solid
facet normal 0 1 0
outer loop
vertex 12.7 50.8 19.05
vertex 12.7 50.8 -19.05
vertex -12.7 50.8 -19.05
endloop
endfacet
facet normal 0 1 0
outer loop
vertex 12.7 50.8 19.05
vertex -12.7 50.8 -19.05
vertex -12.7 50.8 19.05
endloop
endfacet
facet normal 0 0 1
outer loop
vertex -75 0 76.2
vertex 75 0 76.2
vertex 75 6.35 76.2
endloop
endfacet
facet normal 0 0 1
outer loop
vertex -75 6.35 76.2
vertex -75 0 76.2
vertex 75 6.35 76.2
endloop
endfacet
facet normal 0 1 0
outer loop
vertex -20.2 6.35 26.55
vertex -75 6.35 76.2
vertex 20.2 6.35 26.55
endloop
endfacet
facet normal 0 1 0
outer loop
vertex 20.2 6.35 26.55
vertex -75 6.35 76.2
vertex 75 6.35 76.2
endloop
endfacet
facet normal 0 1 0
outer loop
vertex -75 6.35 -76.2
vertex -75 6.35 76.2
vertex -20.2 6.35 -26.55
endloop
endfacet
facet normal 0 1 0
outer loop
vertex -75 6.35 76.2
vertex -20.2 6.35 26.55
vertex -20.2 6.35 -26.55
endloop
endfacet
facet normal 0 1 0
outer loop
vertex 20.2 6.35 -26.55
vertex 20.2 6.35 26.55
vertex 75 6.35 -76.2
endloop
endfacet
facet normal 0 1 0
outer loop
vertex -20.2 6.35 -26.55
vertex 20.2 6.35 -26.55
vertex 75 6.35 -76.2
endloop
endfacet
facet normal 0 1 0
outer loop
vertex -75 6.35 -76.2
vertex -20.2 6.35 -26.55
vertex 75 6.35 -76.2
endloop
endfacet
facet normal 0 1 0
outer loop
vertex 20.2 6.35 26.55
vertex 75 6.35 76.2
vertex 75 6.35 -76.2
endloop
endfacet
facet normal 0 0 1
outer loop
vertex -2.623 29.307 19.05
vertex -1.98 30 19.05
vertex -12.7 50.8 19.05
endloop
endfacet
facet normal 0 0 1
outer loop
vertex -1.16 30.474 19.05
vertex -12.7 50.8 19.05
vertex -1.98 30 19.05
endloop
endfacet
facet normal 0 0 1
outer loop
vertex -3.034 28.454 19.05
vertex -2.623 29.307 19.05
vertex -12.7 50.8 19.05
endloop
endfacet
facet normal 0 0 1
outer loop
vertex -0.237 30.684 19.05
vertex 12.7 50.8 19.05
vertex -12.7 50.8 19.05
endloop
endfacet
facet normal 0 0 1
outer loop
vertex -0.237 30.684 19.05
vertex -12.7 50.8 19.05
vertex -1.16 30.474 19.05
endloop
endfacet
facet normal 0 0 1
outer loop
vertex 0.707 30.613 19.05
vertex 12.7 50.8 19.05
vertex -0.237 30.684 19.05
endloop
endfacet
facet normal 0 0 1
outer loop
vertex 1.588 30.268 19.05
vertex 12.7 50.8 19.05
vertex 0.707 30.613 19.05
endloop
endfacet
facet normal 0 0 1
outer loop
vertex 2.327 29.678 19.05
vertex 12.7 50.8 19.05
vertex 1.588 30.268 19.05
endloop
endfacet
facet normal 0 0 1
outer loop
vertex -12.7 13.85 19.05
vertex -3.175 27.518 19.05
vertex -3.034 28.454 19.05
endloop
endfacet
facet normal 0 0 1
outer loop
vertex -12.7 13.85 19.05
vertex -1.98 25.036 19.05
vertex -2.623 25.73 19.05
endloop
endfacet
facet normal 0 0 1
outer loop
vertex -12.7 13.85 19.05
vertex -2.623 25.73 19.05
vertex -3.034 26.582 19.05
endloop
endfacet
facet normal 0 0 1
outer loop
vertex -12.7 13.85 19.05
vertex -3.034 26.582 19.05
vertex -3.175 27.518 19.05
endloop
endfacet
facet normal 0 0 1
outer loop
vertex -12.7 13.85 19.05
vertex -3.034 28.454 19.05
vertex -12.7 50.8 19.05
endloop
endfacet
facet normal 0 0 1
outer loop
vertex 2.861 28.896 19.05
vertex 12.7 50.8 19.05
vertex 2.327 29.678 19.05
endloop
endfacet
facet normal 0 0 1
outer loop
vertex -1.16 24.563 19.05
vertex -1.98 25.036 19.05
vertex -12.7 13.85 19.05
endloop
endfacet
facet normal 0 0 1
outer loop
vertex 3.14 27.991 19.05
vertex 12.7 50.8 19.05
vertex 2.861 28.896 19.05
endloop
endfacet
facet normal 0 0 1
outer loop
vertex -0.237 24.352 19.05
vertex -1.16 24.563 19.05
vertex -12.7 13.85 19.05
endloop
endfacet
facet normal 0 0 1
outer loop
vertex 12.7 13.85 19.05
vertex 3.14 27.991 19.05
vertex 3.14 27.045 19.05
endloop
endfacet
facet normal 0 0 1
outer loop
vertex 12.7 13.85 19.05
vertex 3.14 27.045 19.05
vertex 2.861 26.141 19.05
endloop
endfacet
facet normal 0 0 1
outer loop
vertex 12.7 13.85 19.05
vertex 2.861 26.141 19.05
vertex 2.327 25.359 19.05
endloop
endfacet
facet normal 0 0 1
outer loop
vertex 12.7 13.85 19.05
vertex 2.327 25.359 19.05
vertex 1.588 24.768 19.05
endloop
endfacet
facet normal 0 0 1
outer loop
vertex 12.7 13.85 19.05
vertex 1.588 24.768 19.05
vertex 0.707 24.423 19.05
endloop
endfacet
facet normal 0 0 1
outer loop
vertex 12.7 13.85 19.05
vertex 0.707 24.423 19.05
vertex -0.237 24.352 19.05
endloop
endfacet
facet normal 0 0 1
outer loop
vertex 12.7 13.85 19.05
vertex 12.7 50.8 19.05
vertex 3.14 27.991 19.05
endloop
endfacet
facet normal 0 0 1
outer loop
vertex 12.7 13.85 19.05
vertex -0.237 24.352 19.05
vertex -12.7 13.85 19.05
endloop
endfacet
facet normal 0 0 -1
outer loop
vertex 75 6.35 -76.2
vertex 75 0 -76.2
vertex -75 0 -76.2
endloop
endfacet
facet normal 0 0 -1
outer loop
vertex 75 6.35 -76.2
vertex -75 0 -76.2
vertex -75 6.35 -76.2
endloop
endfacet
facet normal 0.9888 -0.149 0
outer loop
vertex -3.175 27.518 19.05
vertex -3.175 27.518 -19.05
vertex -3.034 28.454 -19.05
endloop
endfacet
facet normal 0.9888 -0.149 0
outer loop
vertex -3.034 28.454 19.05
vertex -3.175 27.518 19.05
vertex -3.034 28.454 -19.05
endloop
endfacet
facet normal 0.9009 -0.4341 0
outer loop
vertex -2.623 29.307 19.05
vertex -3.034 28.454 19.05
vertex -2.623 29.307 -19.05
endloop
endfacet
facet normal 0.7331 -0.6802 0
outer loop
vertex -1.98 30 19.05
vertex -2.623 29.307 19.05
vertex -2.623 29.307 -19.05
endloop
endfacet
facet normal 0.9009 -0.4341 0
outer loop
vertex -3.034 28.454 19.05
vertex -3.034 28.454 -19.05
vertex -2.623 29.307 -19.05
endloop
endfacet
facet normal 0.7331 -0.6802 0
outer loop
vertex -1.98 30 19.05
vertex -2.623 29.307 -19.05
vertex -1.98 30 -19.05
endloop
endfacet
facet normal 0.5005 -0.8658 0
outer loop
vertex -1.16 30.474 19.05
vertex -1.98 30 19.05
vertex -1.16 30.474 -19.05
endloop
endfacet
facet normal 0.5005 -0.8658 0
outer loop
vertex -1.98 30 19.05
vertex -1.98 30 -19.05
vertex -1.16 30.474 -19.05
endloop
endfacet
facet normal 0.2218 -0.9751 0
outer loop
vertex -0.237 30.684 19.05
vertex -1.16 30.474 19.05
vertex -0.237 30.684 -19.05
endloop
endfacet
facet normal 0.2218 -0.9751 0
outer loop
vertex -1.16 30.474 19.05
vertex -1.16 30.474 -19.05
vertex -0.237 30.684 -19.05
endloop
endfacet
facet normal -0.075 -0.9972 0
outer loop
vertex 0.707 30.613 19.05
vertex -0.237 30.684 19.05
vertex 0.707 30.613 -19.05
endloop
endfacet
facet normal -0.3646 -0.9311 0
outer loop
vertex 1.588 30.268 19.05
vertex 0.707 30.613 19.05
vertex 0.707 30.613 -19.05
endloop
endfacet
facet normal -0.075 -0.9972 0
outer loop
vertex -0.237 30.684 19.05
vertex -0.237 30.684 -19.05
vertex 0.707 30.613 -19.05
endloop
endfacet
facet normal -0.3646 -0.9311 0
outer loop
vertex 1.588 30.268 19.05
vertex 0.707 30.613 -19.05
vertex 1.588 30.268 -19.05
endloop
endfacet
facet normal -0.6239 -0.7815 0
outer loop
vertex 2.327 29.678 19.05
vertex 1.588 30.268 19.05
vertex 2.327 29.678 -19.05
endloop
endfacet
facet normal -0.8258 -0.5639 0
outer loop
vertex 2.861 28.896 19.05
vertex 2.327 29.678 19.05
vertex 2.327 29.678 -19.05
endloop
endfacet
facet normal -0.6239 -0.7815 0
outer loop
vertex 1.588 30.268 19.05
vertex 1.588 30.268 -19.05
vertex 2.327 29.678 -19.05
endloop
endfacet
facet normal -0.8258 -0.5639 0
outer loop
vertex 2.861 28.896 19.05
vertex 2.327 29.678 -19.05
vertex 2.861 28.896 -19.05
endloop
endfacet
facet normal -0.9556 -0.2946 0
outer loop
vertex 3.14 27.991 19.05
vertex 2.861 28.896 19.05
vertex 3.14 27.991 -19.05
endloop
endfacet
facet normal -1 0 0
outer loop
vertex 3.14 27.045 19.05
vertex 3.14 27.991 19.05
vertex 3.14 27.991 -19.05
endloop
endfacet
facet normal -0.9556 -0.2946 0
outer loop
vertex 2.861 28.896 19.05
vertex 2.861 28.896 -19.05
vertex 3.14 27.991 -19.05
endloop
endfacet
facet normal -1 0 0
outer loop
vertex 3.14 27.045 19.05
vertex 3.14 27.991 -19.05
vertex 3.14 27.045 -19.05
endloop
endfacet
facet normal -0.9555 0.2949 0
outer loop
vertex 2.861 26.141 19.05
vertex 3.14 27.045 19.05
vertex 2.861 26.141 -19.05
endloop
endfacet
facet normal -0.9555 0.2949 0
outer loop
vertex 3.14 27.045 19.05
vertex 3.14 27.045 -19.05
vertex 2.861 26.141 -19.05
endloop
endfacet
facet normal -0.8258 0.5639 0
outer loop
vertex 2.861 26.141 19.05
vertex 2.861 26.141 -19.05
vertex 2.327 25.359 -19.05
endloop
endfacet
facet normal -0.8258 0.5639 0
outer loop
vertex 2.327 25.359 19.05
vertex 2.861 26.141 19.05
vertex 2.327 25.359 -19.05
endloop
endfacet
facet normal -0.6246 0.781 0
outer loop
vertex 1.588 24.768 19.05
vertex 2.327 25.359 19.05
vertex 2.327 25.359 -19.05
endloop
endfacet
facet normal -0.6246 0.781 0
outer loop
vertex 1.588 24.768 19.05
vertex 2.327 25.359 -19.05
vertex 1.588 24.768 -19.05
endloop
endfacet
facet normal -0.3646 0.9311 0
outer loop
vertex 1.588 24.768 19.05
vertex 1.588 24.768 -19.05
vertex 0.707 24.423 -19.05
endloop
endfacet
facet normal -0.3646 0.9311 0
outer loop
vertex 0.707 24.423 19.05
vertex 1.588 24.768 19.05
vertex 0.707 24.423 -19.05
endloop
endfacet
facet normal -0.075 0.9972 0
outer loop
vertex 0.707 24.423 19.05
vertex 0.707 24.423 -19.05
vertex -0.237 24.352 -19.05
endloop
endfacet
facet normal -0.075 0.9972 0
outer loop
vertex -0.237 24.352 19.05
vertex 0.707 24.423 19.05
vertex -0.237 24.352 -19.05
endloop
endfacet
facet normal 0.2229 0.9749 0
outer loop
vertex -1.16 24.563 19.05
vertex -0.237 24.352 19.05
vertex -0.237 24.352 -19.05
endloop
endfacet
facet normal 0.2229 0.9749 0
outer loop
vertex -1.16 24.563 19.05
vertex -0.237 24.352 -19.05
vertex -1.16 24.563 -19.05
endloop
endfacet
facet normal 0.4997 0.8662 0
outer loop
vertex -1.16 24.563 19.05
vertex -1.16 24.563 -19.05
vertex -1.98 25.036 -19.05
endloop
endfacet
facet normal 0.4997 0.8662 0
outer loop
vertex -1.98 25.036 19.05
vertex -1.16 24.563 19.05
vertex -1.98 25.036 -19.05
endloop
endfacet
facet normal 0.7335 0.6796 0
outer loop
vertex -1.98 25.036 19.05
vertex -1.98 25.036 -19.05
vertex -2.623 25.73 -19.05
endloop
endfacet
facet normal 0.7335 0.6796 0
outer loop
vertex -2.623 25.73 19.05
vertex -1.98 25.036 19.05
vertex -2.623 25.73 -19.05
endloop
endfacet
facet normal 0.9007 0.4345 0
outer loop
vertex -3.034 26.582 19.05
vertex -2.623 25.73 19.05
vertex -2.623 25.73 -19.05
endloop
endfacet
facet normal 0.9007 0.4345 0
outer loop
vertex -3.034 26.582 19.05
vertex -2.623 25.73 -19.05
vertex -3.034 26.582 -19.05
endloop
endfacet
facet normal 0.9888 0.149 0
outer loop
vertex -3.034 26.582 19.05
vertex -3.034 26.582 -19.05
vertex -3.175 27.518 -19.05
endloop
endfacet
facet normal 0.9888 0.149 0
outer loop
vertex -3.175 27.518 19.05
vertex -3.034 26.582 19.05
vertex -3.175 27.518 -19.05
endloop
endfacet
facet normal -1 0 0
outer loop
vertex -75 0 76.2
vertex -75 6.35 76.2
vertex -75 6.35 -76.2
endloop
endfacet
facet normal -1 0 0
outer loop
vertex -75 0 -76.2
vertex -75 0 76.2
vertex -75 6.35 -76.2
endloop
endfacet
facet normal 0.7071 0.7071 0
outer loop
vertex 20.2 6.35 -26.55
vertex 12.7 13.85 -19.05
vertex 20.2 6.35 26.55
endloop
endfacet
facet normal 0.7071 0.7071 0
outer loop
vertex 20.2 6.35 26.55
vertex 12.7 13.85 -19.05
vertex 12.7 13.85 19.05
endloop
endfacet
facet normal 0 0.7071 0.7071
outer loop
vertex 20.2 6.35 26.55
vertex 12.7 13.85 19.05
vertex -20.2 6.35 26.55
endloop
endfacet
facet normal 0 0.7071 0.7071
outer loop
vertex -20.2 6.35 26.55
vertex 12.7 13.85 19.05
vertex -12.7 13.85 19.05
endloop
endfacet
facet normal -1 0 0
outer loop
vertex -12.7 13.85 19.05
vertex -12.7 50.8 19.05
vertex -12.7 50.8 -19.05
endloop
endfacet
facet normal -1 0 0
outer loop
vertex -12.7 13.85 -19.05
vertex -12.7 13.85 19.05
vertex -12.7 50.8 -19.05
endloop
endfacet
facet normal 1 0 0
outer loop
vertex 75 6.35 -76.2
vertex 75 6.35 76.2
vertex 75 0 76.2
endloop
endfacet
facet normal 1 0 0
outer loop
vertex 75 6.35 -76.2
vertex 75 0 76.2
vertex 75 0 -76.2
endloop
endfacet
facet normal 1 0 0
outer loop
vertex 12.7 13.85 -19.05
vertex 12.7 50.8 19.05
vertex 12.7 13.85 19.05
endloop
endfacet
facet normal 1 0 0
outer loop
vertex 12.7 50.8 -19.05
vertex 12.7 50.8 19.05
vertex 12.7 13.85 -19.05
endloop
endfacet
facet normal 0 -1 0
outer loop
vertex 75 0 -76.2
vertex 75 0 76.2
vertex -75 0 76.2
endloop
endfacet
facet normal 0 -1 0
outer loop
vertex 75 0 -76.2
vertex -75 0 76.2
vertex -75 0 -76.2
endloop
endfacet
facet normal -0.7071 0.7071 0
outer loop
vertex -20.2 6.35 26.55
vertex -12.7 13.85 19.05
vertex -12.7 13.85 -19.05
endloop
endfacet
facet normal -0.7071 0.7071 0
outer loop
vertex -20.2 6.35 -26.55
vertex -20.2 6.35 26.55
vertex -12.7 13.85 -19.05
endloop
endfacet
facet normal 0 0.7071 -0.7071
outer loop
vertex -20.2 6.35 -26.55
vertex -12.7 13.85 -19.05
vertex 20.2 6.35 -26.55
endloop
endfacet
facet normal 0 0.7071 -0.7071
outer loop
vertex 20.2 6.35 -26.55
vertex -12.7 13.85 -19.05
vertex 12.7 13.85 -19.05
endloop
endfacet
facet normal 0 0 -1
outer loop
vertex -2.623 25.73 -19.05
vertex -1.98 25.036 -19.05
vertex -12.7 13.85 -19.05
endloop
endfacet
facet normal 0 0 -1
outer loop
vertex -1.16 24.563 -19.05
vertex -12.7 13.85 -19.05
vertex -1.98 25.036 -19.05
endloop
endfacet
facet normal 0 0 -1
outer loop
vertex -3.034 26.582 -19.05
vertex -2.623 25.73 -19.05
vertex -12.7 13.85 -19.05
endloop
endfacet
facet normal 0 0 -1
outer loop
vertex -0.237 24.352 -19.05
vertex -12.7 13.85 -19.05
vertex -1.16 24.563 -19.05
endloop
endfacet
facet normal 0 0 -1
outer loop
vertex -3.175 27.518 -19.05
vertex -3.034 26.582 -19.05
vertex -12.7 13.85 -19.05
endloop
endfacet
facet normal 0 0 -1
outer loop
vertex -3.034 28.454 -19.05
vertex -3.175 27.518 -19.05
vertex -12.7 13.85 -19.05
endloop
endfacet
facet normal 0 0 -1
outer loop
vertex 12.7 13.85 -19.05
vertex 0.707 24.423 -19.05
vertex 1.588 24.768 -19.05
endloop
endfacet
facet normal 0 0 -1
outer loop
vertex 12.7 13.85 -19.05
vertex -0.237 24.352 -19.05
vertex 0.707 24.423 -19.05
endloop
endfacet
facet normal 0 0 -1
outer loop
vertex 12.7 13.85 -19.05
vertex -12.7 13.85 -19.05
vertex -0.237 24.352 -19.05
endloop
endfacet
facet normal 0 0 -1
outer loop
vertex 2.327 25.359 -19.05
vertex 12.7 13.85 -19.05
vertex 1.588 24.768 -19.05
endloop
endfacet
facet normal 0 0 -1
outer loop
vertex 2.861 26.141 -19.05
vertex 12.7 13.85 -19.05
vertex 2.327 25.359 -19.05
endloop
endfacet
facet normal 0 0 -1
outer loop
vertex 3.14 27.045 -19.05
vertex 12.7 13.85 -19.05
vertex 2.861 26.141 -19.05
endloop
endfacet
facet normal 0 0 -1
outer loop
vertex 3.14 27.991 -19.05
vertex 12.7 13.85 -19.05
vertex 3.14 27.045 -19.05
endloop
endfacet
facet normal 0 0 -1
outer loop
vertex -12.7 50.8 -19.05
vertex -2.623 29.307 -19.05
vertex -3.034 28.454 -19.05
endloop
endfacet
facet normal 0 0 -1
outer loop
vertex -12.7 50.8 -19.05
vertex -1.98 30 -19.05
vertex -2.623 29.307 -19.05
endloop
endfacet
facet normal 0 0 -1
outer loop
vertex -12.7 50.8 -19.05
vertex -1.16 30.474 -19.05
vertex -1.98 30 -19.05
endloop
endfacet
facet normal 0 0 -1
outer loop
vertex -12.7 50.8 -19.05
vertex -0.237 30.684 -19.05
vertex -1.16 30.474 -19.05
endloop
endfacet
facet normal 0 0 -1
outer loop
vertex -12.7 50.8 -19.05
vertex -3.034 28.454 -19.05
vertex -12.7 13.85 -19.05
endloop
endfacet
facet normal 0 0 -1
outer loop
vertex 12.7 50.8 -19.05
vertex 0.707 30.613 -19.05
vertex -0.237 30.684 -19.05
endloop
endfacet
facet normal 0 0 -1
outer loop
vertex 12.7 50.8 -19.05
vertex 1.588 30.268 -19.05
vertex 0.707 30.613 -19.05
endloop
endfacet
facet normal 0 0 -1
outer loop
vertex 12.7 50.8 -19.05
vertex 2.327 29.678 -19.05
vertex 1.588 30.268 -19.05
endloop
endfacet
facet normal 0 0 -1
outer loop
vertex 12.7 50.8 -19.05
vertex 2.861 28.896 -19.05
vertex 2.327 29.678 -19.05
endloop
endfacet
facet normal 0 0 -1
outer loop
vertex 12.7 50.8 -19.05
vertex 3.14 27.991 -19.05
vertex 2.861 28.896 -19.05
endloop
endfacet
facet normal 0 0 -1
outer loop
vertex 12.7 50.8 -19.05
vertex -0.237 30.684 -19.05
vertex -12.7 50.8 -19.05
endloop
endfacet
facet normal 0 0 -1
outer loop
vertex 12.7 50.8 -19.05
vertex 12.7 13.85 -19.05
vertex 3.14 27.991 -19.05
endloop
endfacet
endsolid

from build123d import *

# Parameters (mm, degrees)
BOSS_EXTRUDE1_DEPTH         = 12.7
BOSS_EXTRUDE1_DEPTH_BACK    = 12.7
F_1_4_0_25_DIAMETER_HOLE1_D = 6.35
BOSS_EXTRUDE2_DEPTH         = 75
BOSS_EXTRUDE2_DEPTH_BACK    = 75
SKETCH6_W                   = 152.4
SKETCH6_H                   = 6.35
CHAMFER1_SIZE               = 7.5


with BuildPart() as part:
    # Sketch-Profile → Boss-Extrude1 (new, two sides: drawn at the far end of the back side and taken through both)
    with BuildSketch(Plane(origin=(0, 0, 0), x_dir=(0, 0, -1), z_dir=(1, 0, 0)).offset(-BOSS_EXTRUDE1_DEPTH_BACK)):
        Polygon((-76.2, 6.35), (-76.2, 0), (76.2, 0), (76.2, 6.35), (19.05, 6.35), (19.05, 50.8), (-19.05, 50.8), (-19.05, 6.35), align=None)
    extrude(amount=BOSS_EXTRUDE1_DEPTH + BOSS_EXTRUDE1_DEPTH_BACK)

    # 1/4 (0.25) Diameter Hole1 (through all)
    with Locations(Plane.XY.offset(19.05)):
        with Locations((0, 27.5181)):
            Hole(F_1_4_0_25_DIAMETER_HOLE1_D / 2)

    # Sketch6 → Boss-Extrude2 (add, two sides: drawn at the far end of the back side and taken through both)
    with BuildSketch(Plane(origin=(0, 0, 0), x_dir=(0, 0, -1), z_dir=(1, 0, 0)).offset(-BOSS_EXTRUDE2_DEPTH_BACK)):
        with Locations((0, 3.175)):
            Rectangle(SKETCH6_W, SKETCH6_H)
    extrude(amount=BOSS_EXTRUDE2_DEPTH + BOSS_EXTRUDE2_DEPTH_BACK)

    # Chamfer1
    chamfer1_edges = [part.edges().sort_by_distance(p)[0] for p in [
        (0, 6.35, 19.05),
        (-12.7, 6.35, 0),
        (0, 6.35, -19.05),
        (12.7, 6.35, 0),
    ]]
    chamfer(chamfer1_edges, length=CHAMFER1_SIZE)


solid = part.part
